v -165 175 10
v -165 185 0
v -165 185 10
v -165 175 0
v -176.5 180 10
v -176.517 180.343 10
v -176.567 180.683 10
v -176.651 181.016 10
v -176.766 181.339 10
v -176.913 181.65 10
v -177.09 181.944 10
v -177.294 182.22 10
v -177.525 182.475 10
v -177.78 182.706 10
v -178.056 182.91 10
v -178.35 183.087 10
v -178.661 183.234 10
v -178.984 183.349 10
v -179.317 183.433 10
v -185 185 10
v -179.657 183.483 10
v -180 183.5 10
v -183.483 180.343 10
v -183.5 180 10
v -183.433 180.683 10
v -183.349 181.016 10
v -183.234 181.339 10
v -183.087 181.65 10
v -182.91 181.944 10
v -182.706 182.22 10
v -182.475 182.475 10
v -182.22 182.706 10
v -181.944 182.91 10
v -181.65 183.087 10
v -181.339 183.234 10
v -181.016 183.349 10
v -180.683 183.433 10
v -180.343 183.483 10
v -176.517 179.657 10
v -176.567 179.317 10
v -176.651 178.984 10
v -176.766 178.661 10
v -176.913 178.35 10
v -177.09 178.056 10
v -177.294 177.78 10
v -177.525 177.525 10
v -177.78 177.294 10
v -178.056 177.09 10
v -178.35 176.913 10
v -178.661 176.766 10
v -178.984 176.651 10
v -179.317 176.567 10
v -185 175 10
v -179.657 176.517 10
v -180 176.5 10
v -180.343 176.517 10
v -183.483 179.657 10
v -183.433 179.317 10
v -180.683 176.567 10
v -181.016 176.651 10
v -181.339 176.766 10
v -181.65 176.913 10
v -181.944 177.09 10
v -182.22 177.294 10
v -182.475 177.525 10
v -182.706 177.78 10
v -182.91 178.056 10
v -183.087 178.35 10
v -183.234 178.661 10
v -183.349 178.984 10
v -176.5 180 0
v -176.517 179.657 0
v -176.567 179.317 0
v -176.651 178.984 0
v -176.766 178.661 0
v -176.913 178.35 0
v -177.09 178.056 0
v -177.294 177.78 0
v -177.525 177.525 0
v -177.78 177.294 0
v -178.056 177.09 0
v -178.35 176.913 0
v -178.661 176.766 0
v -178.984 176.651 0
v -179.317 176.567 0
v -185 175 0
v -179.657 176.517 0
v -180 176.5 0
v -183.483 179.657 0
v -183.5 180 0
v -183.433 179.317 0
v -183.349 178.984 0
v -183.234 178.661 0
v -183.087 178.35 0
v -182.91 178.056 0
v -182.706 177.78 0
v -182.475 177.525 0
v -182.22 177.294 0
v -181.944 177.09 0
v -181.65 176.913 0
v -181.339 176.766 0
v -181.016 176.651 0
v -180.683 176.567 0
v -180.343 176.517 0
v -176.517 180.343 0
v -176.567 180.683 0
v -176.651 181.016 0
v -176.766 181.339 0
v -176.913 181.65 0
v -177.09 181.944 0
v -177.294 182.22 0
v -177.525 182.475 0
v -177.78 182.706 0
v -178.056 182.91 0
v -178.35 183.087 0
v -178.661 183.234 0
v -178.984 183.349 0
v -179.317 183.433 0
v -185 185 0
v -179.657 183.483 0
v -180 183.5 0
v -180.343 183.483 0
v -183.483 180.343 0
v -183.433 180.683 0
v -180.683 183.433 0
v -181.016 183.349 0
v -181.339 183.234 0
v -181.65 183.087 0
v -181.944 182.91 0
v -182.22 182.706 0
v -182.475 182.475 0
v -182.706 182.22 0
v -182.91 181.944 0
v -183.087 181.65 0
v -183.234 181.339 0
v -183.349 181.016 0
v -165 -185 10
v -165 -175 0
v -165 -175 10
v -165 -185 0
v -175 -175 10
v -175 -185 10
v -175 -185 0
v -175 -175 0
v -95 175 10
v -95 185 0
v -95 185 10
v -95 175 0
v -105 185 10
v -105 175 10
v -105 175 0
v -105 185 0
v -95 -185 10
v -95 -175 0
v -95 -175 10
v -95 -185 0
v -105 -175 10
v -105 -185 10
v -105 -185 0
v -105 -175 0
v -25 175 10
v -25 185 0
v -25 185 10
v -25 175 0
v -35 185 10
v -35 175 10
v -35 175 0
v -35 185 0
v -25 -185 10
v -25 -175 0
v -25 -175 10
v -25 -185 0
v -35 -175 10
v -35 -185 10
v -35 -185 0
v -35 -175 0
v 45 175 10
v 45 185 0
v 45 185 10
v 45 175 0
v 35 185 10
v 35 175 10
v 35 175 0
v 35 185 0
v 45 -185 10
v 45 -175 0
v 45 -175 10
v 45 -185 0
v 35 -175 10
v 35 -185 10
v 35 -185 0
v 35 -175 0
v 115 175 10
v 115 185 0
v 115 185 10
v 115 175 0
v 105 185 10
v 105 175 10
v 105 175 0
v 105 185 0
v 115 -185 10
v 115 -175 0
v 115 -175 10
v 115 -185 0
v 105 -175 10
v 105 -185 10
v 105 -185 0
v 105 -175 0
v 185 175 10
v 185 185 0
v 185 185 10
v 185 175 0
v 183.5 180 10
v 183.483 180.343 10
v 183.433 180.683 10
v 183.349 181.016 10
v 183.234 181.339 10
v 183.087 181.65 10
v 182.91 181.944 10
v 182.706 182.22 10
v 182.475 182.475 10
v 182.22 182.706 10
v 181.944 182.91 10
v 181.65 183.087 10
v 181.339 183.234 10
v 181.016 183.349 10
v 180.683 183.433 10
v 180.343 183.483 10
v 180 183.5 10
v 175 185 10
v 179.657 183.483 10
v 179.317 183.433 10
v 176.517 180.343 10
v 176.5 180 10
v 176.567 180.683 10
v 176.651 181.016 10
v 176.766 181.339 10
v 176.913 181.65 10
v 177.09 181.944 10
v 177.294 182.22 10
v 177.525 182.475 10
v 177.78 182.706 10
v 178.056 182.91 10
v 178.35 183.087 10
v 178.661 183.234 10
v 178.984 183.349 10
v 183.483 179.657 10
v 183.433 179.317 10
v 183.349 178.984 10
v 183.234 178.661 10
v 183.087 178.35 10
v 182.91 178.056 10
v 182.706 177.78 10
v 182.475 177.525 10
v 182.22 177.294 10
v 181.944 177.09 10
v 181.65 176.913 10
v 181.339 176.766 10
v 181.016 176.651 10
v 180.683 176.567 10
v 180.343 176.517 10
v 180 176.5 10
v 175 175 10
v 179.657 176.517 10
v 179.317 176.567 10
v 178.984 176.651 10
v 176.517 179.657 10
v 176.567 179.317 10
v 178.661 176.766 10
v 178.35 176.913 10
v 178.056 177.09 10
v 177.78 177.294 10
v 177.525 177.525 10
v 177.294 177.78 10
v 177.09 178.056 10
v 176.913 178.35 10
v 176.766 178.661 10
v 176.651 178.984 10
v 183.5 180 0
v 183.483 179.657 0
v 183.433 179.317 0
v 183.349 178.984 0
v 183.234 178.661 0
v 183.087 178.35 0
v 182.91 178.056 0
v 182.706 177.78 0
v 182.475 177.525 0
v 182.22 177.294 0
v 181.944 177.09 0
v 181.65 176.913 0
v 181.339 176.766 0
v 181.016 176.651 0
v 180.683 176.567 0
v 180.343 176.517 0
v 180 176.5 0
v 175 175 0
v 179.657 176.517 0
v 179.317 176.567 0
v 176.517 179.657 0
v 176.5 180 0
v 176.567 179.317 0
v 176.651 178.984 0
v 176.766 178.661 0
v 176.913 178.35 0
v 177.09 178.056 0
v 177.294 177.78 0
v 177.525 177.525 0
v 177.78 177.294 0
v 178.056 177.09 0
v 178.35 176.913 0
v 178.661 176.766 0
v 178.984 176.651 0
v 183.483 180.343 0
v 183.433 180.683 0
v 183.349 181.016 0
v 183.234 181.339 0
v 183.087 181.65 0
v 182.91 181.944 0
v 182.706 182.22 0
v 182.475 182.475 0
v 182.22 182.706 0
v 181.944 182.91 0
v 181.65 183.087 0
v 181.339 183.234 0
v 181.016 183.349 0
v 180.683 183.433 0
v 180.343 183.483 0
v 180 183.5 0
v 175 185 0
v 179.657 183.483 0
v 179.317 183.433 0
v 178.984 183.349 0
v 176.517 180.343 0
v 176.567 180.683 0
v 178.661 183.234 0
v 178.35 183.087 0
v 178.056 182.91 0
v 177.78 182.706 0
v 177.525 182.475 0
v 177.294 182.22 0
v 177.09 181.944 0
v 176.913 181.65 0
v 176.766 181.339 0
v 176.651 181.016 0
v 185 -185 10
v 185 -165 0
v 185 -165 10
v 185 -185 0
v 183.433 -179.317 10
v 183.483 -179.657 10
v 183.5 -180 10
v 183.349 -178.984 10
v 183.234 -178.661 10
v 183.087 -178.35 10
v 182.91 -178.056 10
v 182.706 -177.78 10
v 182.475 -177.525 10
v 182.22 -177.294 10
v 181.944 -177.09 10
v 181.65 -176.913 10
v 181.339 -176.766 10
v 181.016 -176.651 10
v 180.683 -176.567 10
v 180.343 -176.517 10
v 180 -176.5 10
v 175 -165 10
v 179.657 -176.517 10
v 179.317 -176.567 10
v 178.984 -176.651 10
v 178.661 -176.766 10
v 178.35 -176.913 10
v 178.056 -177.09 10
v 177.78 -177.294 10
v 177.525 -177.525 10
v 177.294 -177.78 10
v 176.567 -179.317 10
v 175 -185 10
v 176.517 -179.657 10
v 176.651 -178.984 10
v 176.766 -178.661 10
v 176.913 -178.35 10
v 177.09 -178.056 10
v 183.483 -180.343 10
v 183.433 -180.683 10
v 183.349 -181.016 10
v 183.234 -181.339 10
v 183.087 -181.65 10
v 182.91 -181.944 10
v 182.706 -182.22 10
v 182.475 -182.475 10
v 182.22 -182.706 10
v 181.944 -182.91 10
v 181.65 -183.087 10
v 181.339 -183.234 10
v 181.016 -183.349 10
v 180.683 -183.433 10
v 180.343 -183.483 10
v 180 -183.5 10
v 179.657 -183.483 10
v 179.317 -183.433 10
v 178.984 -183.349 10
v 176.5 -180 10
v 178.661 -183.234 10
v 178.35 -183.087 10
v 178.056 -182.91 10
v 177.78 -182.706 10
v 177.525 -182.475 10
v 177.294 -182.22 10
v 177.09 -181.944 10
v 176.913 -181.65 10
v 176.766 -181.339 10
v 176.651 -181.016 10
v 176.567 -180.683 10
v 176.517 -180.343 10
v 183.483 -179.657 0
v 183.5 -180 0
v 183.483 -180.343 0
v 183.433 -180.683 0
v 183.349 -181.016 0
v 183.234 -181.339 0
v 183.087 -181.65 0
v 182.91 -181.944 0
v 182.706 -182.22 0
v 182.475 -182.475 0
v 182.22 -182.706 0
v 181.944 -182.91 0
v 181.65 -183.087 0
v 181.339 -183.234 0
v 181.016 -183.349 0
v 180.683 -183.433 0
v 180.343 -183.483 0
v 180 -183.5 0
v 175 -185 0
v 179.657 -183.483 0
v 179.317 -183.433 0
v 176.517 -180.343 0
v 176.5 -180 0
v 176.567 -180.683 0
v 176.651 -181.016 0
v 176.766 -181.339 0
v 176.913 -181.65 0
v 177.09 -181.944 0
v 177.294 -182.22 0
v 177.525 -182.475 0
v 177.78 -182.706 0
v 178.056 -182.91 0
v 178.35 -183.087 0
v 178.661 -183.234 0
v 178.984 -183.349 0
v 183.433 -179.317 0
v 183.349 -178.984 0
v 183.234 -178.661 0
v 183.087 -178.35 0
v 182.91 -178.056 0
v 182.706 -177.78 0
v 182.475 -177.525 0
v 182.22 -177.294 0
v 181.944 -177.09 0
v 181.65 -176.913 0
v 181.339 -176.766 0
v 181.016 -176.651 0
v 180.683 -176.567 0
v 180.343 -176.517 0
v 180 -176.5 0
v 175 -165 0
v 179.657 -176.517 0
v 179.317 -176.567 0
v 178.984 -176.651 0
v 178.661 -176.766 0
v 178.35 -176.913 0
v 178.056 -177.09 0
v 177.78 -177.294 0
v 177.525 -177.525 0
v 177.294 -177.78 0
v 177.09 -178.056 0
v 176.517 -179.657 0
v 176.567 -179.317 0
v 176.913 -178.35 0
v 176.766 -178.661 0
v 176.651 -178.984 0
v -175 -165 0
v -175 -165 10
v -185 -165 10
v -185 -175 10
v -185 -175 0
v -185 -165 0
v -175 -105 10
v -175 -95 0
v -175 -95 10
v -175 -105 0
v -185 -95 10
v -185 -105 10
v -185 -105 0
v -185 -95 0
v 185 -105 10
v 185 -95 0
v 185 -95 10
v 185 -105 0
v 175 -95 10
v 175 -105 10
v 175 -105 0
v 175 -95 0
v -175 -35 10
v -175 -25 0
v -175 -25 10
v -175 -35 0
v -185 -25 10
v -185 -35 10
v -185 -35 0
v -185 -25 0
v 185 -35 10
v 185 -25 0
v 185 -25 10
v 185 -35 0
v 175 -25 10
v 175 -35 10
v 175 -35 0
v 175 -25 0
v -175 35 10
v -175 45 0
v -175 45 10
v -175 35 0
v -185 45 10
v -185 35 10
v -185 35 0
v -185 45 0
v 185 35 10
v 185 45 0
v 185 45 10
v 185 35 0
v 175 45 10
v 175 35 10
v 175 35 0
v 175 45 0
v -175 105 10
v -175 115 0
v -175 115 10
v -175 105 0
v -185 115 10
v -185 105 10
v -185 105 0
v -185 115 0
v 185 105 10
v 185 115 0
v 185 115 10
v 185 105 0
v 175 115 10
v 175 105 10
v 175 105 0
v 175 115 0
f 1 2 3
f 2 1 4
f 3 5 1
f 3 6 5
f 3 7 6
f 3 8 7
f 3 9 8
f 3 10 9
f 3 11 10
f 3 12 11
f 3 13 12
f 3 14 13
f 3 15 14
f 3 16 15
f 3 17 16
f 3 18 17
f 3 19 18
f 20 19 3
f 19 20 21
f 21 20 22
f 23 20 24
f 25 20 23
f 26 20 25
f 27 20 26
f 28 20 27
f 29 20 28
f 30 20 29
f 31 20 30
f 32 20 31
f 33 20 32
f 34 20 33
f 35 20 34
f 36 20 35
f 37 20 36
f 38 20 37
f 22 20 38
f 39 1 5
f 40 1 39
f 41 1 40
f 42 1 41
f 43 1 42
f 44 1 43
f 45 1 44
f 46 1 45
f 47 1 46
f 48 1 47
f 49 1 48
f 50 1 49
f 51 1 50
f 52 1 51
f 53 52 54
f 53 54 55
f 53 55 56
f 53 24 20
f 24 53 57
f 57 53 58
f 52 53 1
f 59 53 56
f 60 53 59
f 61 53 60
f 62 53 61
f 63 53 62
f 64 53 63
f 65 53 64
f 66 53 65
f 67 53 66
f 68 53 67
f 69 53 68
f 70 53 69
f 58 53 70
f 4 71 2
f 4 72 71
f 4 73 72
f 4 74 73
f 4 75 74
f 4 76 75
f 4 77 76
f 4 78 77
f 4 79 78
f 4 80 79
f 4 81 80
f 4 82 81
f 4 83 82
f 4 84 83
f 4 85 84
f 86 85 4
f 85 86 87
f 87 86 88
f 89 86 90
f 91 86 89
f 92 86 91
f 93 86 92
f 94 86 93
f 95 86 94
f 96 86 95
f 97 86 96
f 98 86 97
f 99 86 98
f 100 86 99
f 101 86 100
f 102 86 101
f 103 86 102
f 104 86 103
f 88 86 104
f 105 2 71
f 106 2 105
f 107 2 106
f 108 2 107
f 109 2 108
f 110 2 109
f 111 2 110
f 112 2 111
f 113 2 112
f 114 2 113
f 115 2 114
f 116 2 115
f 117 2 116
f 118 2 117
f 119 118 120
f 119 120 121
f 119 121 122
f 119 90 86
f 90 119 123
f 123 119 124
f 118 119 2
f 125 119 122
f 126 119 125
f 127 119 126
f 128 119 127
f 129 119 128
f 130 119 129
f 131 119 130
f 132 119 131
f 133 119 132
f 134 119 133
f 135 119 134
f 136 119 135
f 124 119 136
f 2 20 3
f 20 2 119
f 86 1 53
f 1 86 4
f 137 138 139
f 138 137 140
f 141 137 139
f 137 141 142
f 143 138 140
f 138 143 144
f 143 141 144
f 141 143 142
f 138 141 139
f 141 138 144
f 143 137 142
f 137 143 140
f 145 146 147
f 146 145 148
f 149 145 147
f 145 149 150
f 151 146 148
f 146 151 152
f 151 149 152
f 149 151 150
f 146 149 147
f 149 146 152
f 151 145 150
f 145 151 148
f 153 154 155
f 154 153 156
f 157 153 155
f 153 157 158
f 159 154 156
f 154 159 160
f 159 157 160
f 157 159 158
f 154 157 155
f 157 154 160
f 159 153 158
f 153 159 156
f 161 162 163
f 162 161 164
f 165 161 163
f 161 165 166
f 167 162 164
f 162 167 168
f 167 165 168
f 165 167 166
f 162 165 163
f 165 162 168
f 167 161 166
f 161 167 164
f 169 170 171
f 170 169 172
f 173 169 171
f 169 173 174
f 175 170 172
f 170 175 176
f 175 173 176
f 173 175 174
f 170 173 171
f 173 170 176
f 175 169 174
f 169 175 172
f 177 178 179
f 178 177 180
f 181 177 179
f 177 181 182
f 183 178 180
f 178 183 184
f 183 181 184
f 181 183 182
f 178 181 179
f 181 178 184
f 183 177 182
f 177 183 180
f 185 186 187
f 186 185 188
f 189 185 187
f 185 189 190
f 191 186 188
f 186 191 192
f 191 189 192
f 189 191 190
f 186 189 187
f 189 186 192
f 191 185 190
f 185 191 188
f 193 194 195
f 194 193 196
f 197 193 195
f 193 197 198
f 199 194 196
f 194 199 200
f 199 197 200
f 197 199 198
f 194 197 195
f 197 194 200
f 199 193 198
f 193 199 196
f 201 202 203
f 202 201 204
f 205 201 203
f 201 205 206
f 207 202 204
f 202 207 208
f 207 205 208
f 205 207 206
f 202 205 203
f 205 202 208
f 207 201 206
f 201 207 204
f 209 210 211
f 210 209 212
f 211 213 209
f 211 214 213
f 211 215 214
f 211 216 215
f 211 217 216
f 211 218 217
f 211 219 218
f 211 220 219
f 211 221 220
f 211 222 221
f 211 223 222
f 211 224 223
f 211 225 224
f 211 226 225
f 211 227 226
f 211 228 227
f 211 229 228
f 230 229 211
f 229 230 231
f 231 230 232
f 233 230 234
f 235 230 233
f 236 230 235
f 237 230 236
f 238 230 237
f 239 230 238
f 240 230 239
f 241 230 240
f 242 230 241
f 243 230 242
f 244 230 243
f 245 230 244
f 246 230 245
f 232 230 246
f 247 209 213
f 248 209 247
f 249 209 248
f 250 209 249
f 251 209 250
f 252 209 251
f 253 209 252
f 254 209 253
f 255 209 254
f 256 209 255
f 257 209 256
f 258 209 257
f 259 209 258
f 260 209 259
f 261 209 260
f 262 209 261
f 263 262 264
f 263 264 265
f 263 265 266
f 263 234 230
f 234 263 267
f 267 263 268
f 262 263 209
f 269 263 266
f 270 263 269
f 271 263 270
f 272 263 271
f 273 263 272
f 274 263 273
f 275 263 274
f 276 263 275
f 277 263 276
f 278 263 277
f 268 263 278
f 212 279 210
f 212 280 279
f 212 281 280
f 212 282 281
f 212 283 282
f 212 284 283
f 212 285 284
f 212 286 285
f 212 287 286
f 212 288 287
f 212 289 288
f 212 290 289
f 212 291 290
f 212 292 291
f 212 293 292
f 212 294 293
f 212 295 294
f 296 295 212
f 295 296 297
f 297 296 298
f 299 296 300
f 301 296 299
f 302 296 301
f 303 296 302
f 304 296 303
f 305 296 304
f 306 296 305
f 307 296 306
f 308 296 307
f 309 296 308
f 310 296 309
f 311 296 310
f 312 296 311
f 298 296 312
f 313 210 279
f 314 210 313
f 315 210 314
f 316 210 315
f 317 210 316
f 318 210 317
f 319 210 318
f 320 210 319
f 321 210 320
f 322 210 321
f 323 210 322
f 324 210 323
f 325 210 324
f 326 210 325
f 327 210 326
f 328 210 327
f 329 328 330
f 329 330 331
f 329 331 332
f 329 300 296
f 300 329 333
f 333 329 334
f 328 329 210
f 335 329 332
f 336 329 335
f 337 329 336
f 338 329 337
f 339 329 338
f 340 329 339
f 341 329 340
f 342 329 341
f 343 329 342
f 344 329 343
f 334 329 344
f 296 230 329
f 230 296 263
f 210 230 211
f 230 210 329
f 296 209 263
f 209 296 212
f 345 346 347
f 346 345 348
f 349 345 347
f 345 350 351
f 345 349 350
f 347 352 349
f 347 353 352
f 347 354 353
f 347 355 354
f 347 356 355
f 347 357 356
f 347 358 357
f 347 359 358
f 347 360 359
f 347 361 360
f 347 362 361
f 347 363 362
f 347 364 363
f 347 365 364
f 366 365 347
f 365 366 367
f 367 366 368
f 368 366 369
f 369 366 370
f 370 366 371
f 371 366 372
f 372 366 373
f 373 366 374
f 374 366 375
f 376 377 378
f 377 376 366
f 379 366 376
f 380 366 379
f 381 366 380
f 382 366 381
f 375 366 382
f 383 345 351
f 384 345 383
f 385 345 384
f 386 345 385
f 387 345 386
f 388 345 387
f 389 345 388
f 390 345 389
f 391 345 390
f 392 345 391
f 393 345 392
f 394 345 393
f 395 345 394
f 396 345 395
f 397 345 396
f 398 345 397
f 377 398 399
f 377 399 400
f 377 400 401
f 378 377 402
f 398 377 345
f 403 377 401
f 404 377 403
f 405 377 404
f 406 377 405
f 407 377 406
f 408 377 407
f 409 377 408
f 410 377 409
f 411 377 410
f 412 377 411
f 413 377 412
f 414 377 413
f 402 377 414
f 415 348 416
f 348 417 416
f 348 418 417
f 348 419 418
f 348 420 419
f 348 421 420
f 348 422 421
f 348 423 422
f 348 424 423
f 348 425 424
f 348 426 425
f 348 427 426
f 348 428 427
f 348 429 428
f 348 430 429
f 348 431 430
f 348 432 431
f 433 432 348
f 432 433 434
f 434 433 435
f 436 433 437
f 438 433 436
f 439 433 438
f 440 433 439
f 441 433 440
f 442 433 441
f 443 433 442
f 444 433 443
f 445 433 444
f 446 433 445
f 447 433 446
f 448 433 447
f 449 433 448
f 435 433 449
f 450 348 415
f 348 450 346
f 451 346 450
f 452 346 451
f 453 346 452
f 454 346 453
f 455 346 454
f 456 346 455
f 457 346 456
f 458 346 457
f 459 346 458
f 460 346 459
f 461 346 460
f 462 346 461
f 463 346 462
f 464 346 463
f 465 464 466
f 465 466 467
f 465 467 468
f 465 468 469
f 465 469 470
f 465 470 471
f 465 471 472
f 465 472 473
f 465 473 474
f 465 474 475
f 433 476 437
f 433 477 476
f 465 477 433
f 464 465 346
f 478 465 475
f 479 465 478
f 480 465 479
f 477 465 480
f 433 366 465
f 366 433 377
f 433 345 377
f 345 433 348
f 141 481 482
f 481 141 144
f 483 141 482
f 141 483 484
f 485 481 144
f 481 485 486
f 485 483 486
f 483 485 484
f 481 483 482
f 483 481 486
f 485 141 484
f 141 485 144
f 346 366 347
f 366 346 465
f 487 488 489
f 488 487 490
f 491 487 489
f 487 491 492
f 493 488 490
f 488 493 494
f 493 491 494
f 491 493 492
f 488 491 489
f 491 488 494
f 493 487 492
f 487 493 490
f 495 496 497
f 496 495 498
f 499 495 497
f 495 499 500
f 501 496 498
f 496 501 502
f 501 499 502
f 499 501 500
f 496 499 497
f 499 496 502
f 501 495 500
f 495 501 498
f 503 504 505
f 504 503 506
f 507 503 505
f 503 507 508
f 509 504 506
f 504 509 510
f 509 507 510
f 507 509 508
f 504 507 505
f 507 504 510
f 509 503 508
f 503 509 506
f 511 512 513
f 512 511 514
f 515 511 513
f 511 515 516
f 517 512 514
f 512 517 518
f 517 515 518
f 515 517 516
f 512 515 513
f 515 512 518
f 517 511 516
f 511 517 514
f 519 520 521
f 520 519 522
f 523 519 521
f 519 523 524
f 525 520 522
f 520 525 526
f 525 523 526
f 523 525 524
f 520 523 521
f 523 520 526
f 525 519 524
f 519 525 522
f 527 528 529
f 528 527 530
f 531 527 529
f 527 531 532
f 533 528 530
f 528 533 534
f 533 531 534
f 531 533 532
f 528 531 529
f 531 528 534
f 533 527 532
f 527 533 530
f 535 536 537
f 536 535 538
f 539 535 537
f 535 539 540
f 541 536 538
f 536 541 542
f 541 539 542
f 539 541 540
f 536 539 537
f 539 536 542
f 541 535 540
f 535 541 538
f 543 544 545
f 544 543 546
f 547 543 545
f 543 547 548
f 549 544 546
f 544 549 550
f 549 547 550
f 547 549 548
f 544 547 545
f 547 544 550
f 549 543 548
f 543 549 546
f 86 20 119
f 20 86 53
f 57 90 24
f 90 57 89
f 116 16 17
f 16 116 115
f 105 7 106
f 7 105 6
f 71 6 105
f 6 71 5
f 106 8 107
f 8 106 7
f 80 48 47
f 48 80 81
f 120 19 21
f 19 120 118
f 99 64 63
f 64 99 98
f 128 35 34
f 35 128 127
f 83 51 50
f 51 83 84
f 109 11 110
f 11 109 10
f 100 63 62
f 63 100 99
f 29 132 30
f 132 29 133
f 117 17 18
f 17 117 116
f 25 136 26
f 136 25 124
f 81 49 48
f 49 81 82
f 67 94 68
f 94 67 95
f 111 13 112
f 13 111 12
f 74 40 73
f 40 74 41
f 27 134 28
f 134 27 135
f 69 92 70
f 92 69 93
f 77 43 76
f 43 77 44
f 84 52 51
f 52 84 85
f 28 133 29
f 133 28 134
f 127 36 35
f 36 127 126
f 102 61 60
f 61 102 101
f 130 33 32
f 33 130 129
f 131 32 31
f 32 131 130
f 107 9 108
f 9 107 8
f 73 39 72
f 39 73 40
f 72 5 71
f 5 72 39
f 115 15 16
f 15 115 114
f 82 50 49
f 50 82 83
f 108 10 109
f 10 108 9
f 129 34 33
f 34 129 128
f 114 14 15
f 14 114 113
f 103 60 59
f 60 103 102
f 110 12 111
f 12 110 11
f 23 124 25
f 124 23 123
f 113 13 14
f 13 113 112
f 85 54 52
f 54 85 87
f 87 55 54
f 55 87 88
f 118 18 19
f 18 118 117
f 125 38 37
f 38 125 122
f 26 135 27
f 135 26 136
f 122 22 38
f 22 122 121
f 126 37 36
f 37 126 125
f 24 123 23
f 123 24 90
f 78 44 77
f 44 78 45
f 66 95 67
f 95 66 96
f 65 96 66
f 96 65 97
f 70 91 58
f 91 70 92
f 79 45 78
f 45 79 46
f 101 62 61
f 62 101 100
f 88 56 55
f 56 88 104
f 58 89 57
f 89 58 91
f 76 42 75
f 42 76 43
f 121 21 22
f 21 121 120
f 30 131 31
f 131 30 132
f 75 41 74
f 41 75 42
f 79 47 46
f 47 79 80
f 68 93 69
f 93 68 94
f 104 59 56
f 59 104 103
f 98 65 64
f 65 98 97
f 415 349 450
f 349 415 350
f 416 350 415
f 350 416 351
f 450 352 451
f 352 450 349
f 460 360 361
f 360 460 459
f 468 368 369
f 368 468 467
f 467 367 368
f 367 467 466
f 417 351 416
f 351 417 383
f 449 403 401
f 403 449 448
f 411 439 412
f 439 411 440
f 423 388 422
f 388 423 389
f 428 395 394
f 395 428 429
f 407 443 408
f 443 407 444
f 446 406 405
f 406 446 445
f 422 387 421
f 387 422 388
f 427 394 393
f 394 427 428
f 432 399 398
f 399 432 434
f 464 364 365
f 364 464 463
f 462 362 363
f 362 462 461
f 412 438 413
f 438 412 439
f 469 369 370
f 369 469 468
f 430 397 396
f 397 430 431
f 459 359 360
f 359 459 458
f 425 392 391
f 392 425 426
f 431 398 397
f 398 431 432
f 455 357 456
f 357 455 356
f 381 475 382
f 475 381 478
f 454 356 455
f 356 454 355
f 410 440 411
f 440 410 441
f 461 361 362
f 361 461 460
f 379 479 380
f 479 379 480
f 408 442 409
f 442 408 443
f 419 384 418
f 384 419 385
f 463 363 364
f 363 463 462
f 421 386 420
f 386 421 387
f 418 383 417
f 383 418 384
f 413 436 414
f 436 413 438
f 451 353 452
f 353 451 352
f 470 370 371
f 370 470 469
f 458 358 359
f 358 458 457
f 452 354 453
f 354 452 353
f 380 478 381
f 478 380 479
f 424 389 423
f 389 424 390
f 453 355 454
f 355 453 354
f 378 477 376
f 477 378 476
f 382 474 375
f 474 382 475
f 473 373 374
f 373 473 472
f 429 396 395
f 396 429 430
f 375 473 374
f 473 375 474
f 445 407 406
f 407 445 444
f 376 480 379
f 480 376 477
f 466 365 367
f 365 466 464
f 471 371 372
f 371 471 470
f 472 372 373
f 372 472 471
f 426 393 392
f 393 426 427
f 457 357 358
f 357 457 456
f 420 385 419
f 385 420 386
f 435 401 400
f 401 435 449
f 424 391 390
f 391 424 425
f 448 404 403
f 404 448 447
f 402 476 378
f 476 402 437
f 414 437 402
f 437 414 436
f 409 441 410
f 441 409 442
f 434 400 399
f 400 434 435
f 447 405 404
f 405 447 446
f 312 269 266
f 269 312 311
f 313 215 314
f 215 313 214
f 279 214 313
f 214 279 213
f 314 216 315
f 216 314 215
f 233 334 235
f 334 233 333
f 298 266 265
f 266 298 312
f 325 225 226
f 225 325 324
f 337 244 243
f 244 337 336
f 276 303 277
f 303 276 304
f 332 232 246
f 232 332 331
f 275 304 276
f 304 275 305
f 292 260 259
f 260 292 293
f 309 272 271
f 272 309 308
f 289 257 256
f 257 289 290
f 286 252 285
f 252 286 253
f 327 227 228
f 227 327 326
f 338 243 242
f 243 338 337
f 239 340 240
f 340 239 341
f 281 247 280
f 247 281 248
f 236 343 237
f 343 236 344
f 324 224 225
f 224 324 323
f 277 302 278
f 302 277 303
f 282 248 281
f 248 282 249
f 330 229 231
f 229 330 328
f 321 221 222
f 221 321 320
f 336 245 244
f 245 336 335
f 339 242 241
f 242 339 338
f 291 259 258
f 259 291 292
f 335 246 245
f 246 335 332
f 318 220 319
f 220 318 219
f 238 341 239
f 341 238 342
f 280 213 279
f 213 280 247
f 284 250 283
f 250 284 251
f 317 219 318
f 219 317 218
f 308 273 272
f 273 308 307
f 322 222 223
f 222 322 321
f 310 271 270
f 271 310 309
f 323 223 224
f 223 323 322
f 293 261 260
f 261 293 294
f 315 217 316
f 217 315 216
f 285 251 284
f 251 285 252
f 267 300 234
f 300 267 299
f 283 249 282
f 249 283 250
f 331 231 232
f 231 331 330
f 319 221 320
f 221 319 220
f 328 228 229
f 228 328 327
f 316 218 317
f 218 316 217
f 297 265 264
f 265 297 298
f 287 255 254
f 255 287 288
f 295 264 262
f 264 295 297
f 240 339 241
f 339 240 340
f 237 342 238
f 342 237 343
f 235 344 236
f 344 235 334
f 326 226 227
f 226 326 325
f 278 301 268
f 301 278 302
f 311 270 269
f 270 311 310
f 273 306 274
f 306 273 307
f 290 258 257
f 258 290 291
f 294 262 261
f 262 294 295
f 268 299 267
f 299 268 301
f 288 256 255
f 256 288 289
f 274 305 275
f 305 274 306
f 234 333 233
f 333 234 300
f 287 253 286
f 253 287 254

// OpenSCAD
// ring_32.scad - ring index 32 (z bottom = 320 mm)
$fn = 64; bar = 10; half_b = bar/2; outer = 370; half_outer = outer/2;
front_y = 180; back_y = -180; left_x = -180; right_x = 180;
x_centers = [-170, -100, -30, 40, 110, 180];
z_centers = [5, 85, 155, 225, 295, 365, 435, 505, 575, 645, 715]; ring_z = 320;
module place_box(cx, cy, sx, sy) { translate([cx - sx/2, cy - sy/2, 0]) cube([sx, sy, bar]); }

difference() { union() {
    for (x = x_centers) { place_box(x, front_y, bar, bar); place_box(x, back_y, bar, bar); }
    for (y = x_centers) { place_box(left_x, y, bar, bar); place_box(right_x, y, bar, bar); }
    for (zc = z_centers) if ((zc - half_b < ring_z + bar) && (zc + half_b > ring_z)) {
        translate([-half_outer, front_y - half_b, 0]) cube([outer, bar, bar]);
        translate([-half_outer, back_y - half_b, 0])  cube([outer, bar, bar]);
        translate([left_x - half_b, -half_outer, 0])  cube([bar, outer, bar]);
        translate([right_x - half_b, -half_outer, 0]) cube([bar, outer, bar]);
    }
  }
  for (cx = [-180, 180]) for (cy = [-180, 180]) translate([cx, cy, 0]) cylinder(h = bar, r = 3.5, $fn = 64);
}
